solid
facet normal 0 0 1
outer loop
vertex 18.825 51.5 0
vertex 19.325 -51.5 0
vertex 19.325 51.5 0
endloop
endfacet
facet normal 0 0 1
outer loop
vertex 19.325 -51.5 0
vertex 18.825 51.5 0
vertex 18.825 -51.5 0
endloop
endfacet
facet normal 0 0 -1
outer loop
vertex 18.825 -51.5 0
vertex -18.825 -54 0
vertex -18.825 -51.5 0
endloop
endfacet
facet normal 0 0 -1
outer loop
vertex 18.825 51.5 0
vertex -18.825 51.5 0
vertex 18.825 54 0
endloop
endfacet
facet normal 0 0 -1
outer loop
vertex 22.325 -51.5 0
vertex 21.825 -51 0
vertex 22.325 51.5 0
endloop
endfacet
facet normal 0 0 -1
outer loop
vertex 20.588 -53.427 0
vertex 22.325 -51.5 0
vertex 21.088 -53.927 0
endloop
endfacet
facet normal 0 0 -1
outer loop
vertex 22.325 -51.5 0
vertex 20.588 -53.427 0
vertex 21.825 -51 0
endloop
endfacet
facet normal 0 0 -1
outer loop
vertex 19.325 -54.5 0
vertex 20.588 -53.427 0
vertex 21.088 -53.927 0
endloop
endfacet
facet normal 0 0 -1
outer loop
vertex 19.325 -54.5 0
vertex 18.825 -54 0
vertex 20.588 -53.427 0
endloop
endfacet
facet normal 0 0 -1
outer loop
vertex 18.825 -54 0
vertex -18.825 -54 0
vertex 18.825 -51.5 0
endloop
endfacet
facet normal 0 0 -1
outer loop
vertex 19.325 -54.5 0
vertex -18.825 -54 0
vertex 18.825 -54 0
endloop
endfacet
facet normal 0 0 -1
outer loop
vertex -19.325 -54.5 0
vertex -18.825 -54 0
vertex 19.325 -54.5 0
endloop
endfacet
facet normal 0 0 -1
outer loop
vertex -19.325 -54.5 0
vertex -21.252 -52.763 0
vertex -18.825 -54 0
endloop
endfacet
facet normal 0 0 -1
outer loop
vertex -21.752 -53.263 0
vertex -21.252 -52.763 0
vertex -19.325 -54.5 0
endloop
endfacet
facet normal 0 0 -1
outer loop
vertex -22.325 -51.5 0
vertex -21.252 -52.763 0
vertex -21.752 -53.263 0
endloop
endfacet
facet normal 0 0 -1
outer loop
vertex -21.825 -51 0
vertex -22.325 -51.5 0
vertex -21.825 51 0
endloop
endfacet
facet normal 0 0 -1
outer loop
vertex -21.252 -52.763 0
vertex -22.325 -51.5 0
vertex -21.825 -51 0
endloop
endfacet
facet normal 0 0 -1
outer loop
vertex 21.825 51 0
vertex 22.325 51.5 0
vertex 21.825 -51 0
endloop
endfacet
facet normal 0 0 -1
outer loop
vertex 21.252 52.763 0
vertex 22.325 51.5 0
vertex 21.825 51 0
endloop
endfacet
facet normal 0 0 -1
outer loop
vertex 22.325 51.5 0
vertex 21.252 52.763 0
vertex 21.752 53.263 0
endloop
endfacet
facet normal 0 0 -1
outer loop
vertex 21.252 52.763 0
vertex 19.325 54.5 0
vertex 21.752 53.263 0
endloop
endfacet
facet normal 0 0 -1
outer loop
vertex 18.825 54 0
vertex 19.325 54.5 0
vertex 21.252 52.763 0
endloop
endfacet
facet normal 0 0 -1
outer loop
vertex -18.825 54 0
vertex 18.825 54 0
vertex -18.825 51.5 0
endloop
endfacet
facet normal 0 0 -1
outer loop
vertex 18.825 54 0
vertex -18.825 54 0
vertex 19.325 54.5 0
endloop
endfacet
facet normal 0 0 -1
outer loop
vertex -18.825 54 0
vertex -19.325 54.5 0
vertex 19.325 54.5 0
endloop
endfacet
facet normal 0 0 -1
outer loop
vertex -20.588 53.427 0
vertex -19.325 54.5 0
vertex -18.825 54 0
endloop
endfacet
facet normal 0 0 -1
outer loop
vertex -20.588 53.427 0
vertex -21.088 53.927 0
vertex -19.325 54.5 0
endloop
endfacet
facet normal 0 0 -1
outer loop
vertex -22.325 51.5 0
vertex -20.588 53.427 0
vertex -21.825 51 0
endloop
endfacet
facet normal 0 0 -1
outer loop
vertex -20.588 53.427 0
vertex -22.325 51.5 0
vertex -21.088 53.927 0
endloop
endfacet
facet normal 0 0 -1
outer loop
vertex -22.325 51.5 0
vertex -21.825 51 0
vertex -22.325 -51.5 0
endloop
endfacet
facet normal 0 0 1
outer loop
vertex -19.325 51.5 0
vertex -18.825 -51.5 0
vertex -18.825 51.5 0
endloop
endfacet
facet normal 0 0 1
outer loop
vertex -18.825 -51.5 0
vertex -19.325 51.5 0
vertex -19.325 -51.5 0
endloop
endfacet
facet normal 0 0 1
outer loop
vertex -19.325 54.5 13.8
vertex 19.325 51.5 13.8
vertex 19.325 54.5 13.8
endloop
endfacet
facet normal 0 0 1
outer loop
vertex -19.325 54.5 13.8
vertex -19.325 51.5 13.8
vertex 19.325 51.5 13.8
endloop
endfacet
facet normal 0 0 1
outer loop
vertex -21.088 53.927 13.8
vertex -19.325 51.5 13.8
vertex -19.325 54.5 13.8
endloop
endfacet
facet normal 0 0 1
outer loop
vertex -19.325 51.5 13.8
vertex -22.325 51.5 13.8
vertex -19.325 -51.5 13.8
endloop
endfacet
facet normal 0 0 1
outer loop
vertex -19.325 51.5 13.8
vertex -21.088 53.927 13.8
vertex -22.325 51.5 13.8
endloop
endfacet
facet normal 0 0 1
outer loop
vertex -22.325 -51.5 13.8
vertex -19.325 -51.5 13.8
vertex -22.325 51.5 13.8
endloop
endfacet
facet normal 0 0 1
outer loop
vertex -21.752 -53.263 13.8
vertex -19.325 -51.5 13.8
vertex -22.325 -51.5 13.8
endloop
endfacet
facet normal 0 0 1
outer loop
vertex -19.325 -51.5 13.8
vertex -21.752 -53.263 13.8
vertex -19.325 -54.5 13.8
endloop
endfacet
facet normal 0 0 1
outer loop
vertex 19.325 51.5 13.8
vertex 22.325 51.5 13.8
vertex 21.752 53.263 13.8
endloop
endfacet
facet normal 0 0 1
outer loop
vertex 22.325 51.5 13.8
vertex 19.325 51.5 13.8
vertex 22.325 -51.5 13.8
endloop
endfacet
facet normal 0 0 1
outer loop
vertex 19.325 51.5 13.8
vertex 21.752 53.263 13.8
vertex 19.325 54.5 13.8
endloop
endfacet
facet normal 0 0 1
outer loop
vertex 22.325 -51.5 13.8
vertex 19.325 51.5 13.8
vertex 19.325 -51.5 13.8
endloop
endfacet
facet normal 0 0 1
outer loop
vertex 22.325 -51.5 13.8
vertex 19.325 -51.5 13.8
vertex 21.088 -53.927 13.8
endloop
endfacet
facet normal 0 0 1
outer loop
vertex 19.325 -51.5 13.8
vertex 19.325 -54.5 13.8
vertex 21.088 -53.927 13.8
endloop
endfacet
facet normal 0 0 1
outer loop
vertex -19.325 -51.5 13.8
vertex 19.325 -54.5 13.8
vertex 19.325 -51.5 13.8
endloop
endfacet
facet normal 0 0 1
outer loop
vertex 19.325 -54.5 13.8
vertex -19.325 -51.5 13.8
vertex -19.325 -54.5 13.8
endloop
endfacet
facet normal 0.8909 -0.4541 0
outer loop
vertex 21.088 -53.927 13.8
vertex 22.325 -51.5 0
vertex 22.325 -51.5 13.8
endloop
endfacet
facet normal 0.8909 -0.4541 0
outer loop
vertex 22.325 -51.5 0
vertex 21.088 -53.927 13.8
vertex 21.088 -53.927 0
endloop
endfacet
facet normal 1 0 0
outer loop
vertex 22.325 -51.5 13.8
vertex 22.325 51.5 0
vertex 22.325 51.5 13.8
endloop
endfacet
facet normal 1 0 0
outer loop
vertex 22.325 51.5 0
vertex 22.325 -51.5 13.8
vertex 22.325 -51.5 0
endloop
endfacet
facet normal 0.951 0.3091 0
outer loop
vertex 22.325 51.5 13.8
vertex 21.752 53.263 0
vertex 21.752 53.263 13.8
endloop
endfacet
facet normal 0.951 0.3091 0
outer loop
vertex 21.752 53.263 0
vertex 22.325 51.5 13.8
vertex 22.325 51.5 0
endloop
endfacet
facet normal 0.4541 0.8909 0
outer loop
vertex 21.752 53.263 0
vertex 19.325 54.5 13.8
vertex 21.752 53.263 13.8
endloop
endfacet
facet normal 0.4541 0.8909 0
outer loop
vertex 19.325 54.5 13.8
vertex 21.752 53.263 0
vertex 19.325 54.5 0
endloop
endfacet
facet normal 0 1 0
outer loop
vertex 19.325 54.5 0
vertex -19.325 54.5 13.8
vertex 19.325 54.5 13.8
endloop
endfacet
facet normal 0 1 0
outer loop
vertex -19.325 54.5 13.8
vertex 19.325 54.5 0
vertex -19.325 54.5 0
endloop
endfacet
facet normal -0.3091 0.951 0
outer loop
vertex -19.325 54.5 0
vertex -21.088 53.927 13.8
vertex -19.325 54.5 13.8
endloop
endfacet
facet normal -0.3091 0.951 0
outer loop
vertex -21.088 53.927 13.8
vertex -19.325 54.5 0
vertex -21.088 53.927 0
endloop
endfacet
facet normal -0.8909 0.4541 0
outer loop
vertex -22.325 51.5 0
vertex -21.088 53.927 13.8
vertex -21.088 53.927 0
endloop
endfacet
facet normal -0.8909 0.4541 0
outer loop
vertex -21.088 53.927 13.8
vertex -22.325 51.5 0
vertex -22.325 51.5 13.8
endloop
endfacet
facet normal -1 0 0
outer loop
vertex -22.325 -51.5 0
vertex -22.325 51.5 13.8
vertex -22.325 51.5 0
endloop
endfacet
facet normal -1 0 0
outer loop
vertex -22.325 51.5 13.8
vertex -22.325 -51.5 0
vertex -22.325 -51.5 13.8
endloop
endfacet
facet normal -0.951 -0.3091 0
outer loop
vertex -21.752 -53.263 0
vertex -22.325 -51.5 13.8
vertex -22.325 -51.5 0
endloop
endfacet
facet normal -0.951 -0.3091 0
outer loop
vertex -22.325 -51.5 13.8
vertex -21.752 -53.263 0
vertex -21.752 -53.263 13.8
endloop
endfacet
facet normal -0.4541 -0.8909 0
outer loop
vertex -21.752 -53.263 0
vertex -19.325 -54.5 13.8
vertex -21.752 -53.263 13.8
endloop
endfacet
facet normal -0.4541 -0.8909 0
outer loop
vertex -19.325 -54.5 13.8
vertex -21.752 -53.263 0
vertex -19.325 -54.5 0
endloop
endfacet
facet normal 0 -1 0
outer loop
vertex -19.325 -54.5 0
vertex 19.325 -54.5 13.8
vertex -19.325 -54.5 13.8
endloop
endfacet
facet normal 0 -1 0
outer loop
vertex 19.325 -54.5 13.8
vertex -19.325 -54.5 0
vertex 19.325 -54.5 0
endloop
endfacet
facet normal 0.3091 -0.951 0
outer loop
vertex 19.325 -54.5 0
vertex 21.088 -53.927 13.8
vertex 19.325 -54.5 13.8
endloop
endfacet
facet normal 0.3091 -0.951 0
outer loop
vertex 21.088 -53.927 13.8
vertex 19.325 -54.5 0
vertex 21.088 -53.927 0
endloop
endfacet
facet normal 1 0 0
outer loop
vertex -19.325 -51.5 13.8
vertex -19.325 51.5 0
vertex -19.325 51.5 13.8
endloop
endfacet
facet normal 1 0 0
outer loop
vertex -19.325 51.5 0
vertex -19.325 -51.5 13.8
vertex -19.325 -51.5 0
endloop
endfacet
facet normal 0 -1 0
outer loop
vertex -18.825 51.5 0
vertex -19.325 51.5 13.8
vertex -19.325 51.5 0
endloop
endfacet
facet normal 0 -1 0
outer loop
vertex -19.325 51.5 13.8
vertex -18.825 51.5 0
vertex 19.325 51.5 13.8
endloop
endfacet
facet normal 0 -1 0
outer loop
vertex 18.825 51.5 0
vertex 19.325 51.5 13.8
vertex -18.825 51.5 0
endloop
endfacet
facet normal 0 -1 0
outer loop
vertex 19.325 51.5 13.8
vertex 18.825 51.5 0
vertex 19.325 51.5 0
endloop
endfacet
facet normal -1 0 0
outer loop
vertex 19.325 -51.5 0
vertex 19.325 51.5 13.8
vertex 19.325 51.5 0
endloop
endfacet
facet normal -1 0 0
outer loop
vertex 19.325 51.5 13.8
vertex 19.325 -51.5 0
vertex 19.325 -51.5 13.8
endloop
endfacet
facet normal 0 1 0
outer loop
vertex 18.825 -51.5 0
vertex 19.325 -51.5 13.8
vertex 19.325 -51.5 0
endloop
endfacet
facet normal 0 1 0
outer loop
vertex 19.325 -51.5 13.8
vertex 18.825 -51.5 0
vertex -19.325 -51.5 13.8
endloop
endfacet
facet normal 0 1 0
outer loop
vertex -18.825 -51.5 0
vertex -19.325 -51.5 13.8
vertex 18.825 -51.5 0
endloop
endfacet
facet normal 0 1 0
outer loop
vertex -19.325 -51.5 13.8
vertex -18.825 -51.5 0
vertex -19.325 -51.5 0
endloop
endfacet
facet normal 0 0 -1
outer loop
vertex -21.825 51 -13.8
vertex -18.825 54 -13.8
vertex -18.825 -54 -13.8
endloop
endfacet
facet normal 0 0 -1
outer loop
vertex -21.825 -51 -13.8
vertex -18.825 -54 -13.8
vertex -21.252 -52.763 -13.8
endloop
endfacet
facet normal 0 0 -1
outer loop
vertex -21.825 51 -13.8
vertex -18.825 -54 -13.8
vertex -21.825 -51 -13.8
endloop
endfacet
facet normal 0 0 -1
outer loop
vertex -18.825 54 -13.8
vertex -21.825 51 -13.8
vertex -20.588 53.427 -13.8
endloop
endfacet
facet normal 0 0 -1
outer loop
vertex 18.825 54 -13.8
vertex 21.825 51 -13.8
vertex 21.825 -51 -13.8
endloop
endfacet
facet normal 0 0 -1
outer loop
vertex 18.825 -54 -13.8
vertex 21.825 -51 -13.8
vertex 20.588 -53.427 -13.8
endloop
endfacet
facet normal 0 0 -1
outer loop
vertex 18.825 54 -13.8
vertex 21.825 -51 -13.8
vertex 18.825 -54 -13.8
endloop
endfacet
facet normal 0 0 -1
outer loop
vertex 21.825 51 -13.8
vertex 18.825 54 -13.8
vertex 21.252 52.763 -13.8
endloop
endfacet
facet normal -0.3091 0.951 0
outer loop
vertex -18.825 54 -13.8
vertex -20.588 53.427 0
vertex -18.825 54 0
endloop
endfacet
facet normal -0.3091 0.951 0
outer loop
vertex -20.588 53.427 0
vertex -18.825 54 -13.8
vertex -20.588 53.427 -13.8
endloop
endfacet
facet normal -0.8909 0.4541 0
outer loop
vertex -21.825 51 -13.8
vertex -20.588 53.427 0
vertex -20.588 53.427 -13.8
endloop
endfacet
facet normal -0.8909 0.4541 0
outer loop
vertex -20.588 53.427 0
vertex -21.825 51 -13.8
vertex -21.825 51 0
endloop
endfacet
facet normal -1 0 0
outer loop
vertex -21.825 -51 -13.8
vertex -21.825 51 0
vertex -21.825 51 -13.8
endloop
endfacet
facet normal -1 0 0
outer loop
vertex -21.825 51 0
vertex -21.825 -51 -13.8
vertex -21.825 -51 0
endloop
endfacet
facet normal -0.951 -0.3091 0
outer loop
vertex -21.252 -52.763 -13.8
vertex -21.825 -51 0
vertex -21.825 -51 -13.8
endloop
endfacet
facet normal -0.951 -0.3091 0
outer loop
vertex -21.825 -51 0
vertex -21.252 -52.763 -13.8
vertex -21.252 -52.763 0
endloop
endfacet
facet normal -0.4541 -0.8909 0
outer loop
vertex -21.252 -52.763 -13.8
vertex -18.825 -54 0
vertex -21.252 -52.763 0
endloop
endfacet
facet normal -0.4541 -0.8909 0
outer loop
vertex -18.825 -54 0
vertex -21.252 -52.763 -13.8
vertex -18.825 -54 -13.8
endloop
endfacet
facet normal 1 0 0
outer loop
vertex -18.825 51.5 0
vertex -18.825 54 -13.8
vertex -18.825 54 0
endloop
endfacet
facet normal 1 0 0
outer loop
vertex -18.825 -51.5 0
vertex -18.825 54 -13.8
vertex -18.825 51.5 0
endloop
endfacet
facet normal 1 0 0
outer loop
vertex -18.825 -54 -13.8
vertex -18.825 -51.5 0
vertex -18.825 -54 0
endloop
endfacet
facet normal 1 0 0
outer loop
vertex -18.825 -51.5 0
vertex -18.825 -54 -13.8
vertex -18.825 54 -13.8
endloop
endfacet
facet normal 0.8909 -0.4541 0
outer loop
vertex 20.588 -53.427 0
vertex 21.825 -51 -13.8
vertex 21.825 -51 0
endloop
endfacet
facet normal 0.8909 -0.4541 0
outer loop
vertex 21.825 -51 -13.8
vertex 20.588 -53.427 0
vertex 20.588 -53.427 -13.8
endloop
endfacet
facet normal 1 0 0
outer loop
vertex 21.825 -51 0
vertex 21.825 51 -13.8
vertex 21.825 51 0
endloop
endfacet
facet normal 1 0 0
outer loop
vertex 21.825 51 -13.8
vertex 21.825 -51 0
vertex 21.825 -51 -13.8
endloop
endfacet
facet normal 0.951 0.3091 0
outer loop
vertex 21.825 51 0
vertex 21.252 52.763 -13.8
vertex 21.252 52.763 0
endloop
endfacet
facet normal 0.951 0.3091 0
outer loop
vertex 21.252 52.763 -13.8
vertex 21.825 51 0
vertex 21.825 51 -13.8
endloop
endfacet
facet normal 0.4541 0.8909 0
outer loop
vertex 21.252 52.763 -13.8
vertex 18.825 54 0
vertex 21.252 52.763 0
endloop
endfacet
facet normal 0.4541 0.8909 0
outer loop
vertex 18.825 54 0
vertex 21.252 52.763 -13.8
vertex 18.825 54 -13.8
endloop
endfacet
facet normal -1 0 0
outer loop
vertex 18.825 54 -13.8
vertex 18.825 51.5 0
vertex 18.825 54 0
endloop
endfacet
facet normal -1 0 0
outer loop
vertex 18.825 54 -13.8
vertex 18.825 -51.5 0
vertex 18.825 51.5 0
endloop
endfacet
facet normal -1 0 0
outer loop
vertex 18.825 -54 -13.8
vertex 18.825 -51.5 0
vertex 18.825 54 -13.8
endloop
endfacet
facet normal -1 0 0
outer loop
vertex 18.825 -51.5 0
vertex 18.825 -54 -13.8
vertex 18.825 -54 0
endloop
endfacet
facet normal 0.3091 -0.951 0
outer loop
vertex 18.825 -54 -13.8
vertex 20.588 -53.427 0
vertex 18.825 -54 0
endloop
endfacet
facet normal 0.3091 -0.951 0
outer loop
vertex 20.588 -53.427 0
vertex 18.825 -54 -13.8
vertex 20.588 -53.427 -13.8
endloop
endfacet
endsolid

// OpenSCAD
width = 37.65;
height = 15;
length = 102;
height_down = 27.6;
tol = 1;

union()
{
    linear_extrude(height = height_down / 2) difference()
    {
        offset(3) square([ width + tol, length + tol ], center = true);
        square([ width + tol, length + tol ], center = true);
    };

    translate([ 0, 0, -height_down / 2 ]) linear_extrude(height = height_down / 2) difference()
    {
        offset(3) square([ width, length ], center = true);
        square([ width, length ], center = true);
        square([ width, length + 20 ], center = true);
    };
}
